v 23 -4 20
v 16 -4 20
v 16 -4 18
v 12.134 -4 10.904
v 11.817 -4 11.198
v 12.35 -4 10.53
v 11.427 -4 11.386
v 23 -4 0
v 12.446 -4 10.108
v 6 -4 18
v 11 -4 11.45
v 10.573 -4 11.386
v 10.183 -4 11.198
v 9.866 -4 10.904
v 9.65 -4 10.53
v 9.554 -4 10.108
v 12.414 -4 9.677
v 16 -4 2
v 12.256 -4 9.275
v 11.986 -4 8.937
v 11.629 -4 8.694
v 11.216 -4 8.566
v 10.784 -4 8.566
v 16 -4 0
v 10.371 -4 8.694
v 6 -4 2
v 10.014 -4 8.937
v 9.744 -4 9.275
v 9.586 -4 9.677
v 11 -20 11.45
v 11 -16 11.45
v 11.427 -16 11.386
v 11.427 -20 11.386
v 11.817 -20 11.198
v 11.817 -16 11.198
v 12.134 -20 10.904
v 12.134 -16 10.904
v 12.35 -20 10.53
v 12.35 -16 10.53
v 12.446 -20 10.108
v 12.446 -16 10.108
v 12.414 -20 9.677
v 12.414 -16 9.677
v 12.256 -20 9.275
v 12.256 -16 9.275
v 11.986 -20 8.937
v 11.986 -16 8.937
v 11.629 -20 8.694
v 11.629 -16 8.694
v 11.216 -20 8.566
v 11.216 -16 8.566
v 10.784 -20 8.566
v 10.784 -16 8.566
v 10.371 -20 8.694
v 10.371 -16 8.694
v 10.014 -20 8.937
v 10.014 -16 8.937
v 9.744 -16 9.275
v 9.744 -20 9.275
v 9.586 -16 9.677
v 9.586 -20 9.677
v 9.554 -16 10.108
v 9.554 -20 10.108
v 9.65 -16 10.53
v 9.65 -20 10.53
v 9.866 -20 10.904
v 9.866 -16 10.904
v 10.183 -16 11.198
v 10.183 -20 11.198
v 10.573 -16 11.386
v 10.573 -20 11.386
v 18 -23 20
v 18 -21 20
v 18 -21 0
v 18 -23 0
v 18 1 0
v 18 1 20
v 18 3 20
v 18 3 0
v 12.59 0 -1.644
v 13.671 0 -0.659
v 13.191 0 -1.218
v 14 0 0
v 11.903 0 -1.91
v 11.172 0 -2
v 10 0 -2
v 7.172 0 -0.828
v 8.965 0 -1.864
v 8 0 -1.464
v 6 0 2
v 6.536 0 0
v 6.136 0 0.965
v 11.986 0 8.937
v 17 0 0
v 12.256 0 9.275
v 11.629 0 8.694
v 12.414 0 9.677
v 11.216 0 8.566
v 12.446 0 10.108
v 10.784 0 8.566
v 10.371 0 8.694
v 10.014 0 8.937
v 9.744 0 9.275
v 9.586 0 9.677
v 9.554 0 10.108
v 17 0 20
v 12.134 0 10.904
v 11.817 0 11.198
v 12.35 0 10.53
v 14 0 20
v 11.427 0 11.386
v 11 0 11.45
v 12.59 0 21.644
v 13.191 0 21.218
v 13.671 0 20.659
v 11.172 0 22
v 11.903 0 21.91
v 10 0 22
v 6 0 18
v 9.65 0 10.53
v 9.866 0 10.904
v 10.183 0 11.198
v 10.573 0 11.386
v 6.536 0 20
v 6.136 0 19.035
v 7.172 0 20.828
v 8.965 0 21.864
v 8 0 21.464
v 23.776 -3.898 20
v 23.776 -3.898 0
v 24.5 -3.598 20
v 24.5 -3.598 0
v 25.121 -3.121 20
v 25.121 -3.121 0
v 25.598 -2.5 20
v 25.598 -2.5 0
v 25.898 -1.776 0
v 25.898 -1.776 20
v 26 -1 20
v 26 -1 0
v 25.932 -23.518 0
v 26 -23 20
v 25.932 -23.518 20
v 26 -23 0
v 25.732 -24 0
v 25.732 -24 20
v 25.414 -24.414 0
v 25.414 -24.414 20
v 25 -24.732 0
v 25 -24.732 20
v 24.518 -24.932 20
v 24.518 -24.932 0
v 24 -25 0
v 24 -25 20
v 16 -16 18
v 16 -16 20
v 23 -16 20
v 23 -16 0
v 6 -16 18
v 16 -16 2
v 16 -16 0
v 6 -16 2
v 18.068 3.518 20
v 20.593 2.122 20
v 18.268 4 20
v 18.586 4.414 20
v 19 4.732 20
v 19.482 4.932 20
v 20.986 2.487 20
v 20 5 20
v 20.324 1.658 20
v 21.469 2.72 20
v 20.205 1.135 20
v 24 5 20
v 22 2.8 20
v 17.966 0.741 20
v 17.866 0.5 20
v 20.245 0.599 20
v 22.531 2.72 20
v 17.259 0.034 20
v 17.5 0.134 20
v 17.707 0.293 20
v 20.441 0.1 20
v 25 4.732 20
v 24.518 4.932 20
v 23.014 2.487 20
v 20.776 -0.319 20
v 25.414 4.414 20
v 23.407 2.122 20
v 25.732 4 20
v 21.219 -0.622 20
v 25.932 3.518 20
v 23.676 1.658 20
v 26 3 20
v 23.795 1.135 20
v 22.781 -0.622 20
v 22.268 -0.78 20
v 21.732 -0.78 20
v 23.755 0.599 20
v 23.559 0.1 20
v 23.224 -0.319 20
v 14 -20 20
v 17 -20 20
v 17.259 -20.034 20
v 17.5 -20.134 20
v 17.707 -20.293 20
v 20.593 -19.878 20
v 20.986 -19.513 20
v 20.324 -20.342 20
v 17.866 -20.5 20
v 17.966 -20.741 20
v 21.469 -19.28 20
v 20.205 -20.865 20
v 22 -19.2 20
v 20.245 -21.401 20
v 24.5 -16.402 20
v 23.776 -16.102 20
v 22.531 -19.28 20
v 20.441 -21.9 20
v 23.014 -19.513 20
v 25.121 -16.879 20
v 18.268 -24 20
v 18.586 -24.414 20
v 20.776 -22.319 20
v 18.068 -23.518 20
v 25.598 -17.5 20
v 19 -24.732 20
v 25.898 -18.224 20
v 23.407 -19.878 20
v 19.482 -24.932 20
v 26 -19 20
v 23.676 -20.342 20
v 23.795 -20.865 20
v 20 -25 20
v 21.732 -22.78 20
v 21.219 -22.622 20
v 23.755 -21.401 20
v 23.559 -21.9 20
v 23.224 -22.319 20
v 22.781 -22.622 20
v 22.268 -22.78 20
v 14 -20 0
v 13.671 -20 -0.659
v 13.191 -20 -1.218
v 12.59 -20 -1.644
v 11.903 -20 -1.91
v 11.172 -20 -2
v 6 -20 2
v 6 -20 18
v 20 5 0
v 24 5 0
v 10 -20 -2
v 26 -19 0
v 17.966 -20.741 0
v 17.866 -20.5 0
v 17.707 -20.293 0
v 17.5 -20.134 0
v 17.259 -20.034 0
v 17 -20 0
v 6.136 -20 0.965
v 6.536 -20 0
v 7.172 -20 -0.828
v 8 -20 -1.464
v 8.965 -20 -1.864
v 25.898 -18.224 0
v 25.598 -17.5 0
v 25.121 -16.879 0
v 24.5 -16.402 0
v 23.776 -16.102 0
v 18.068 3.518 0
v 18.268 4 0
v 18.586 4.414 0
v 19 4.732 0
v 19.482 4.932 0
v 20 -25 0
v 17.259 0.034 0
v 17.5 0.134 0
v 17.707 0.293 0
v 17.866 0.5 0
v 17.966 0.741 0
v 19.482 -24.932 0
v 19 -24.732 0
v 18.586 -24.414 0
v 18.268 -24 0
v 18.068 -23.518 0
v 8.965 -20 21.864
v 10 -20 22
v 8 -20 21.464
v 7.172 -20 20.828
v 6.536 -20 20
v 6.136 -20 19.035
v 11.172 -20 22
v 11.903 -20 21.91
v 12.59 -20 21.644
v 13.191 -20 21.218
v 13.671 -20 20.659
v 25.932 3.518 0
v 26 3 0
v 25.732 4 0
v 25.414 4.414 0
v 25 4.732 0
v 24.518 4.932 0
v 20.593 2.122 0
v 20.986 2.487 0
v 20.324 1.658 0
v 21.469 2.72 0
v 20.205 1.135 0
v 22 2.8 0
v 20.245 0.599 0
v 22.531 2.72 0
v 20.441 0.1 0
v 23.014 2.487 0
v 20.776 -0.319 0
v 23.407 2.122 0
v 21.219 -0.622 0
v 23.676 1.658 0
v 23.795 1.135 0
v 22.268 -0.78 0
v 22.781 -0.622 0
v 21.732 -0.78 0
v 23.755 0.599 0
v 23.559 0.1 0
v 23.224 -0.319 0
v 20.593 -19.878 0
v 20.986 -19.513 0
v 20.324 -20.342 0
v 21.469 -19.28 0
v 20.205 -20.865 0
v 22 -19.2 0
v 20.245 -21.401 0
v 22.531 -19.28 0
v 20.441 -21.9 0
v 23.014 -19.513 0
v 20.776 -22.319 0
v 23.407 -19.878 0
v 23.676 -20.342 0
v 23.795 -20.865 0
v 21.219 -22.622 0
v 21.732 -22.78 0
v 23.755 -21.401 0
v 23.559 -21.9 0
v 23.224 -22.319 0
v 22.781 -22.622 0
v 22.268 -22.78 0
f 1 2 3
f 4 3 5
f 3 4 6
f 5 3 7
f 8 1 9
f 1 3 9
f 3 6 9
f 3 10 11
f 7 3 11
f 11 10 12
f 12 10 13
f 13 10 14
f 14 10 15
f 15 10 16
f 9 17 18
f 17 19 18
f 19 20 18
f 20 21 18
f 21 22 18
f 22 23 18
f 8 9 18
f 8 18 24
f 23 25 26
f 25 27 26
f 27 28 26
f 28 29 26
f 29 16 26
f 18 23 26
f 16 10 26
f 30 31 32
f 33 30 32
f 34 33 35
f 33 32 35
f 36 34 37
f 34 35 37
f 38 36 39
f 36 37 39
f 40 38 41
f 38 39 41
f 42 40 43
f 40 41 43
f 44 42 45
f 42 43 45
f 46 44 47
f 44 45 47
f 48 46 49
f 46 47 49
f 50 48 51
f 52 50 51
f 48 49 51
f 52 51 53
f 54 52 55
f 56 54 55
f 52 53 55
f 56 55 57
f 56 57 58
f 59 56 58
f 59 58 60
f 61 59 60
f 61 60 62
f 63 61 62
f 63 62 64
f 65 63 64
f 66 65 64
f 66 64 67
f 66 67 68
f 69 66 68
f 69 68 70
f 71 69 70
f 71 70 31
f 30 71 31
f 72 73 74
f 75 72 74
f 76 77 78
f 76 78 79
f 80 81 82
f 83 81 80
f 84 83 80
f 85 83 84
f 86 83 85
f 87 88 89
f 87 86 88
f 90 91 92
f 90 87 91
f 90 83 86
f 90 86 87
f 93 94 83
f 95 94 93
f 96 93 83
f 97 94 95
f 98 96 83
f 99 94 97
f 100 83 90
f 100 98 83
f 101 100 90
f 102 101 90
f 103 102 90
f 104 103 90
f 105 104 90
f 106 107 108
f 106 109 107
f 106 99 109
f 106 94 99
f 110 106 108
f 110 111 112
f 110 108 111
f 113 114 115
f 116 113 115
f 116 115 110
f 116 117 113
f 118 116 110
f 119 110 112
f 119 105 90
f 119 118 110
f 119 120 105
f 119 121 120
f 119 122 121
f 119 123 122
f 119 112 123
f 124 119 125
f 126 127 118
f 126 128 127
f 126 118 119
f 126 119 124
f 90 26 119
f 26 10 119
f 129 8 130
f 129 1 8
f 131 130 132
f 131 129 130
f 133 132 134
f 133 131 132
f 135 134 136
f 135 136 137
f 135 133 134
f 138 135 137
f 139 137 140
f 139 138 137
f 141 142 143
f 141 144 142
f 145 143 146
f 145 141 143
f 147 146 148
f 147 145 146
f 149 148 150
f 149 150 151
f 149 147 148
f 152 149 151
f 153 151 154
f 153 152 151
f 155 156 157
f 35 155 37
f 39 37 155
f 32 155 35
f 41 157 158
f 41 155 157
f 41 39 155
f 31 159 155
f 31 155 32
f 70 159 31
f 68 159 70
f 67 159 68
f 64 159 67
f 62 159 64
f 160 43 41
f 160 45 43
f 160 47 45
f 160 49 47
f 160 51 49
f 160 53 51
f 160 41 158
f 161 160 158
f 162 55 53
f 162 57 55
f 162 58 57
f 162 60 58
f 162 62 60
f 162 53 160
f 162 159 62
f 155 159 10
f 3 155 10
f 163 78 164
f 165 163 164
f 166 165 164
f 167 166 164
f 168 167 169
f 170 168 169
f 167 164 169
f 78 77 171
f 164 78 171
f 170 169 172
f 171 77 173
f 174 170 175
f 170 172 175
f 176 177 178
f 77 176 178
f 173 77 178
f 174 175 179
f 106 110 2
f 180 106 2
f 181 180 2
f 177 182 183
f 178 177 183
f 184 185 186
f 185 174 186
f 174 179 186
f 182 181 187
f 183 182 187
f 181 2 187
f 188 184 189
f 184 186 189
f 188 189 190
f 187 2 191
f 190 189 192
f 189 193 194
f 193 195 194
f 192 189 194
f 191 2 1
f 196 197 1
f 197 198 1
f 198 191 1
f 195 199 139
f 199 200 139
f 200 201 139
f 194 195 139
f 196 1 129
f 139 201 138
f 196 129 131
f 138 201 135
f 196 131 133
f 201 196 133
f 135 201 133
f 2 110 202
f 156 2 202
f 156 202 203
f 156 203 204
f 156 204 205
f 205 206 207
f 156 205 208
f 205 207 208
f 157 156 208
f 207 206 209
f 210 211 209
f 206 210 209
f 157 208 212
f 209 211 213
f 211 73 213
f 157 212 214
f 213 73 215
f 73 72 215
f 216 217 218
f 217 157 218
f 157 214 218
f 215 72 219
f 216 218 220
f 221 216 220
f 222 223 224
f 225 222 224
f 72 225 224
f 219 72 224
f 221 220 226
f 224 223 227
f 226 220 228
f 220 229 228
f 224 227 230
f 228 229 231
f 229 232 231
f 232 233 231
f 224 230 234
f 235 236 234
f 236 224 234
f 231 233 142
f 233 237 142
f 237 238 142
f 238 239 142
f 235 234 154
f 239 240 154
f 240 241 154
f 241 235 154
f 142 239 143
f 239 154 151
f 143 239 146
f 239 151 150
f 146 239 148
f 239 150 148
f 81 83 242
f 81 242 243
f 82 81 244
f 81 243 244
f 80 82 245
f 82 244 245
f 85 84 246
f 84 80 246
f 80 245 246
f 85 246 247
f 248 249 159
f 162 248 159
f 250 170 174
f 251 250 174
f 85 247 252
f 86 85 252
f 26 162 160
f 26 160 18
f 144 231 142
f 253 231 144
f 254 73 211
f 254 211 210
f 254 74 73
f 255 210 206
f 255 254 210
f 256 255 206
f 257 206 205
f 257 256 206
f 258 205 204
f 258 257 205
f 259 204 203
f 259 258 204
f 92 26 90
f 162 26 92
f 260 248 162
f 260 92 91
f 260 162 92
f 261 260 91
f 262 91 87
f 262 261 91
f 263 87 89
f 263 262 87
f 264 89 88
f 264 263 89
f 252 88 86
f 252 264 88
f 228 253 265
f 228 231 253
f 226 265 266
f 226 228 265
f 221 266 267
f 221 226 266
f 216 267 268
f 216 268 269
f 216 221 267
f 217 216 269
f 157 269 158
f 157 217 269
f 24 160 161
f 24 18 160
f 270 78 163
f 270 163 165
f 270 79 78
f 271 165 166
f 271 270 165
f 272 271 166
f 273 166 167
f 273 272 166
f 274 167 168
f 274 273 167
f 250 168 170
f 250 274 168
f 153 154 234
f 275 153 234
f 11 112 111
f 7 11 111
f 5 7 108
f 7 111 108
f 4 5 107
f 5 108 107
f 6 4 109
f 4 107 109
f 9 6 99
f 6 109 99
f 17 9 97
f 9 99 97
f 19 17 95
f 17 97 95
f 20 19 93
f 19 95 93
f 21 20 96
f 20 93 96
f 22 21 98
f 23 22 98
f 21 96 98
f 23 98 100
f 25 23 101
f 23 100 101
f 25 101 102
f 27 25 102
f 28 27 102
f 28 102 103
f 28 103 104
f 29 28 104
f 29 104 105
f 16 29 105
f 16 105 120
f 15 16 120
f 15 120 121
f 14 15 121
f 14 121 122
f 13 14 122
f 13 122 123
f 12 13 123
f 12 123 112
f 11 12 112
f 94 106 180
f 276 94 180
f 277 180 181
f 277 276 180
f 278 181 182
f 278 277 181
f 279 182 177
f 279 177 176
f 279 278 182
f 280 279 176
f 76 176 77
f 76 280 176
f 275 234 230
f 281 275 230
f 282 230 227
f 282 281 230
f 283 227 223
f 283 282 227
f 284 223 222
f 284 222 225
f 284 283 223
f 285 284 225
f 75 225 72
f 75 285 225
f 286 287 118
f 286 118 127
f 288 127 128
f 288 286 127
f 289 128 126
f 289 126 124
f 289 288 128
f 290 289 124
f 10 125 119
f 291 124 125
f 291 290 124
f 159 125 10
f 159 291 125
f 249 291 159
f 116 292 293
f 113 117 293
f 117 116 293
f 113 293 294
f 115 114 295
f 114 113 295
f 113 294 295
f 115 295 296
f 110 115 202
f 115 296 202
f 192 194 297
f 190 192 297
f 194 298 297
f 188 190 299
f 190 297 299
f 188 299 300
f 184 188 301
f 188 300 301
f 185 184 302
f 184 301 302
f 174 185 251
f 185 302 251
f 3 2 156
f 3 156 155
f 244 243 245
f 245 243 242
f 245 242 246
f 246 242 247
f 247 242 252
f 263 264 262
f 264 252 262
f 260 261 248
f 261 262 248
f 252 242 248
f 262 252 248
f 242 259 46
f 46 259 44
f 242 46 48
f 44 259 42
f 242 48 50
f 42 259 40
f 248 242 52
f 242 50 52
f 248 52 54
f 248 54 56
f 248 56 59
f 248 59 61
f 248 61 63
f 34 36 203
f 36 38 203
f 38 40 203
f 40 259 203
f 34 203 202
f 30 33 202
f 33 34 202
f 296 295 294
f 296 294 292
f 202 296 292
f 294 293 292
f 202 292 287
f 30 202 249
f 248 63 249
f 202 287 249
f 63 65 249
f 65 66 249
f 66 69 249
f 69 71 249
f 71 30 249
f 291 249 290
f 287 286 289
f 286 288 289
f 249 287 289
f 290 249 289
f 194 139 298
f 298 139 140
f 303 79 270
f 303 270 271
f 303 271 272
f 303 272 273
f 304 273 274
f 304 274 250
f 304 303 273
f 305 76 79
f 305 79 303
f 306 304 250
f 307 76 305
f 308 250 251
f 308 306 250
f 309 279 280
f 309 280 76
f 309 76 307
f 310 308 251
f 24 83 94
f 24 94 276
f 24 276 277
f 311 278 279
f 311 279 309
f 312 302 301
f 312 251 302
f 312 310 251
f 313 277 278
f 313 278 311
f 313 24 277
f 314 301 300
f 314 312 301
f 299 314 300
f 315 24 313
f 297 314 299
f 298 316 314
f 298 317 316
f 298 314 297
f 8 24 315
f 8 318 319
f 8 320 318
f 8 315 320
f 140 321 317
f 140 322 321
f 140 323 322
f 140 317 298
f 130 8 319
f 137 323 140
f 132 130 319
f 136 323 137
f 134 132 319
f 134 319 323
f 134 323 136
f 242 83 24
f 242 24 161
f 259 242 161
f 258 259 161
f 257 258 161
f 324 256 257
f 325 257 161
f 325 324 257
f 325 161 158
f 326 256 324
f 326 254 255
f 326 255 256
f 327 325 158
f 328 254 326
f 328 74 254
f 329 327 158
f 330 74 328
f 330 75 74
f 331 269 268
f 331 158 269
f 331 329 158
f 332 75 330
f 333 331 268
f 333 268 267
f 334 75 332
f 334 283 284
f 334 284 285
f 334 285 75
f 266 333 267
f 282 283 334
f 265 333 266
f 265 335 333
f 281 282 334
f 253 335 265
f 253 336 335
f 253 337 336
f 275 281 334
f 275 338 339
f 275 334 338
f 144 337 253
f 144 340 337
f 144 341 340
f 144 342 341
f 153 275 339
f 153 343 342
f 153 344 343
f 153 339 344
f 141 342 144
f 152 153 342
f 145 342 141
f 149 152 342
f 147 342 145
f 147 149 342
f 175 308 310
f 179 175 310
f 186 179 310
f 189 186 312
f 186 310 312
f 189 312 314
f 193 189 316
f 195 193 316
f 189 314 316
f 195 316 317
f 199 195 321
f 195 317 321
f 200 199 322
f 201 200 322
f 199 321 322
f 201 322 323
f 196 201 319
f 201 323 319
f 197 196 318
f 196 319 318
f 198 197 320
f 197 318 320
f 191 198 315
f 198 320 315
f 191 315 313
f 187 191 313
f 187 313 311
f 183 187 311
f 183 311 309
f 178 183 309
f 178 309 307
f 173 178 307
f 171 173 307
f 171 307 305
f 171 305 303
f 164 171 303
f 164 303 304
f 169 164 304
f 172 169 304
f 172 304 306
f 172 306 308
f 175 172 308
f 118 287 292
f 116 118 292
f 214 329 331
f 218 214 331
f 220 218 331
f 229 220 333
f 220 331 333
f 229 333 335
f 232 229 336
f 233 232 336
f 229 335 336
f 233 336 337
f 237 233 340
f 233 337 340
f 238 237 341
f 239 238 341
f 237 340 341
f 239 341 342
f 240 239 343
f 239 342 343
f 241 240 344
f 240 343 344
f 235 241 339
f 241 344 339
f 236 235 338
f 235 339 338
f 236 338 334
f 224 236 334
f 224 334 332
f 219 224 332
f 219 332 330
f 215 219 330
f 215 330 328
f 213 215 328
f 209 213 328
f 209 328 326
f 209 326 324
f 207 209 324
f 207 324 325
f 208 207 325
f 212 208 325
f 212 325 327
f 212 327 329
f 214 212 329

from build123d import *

# Parameters (mm, degrees)
SKETCH1_W           = 20
SKETCH1_H           = 20
BOSS_EXTRUDE1_DEPTH = 4
SKETCH2_R           = 3.7
CUT_EXTRUDE1_DEPTH  = 2.6
SKETCH3_R           = 2.1
CUT_EXTRUDE2_DEPTH  = 29.403520909
SKETCH4_W           = 12
SKETCH4_H           = 4
BOSS_EXTRUDE2_DEPTH = 12
SKETCH7_W           = 20
SKETCH7_H           = 4
BOSS_EXTRUDE3_DEPTH = 10
SKETCH8_W           = 8
SKETCH8_H           = 20
BOSS_EXTRUDE4_DEPTH = 5
SKETCH9_W           = 8
SKETCH9_H           = 20
BOSS_EXTRUDE5_DEPTH = 5
SKETCH10_R          = 1.8
CUT_EXTRUDE5_DEPTH  = 42.243181255
SKETCH11_W          = 30
SKETCH11_H          = 30
CUT_EXTRUDE6_DEPTH  = 6
SKETCH12_R          = 1.45
CUT_EXTRUDE7_DEPTH  = 42.243181255
SKETCH13_W          = 8
SKETCH13_H          = 20
BOSS_EXTRUDE6_DEPTH = 2
SKETCH14_W          = 8
SKETCH14_H          = 20
BOSS_EXTRUDE7_DEPTH = 2
SKETCH15_W          = 16
SKETCH15_H          = 12
CUT_EXTRUDE8_DEPTH  = 39.845849199
FILLET2_R           = 3
FILLET4_R           = 2
FILLET5_START       = -21
FILLET5_DEPTH       = 22
FILLET6_R           = 3
FILLET7_R           = 1
FILLET8_R           = 1


with BuildPart() as part:
    # Sketch1 → Boss-Extrude1 (new body)
    with BuildSketch(Plane(origin=(0, 0, 0), x_dir=(0, 0, -1), z_dir=(1, 0, 0))):
        with Locations((-10, -10)):
            Rectangle(SKETCH1_W, SKETCH1_H)
    extrude(amount=BOSS_EXTRUDE1_DEPTH)

    # Sketch2 → Cut-Extrude1 (cut)
    with BuildSketch(Plane(origin=(4, 0, 0), x_dir=(0, 0, -1), z_dir=(1, 0, 0))):
        with Locations((-10, -10)):
            Circle(SKETCH2_R)
    extrude(amount=-CUT_EXTRUDE1_DEPTH, mode=Mode.SUBTRACT)

    # Sketch3 → Cut-Extrude2 (cut, through all)
    with BuildSketch(Plane(origin=(1.4, 0, 0), x_dir=(0, 0, -1), z_dir=(1, 0, 0))):
        with Locations((-10, -10)):
            Circle(SKETCH3_R)
    extrude(amount=-CUT_EXTRUDE2_DEPTH, mode=Mode.SUBTRACT)

    # Sketch4 → Boss-Extrude2 (add)
    with BuildSketch(Plane(origin=(4, 0, 0), x_dir=(0, 0, -1), z_dir=(1, 0, 0))):
        Polygon((-20, 0), (-20, -20), (-16, -20), (-16, -16), (-16, -4), (-16, 0), align=None)
        with Locations((-10, -18)):
            Rectangle(SKETCH4_W, SKETCH4_H)
        Polygon((-4, -16), (-4, -20), (0, -20), (0, -4), (-4, -4), align=None)
        Polygon((0, 0), (-16, 0), (-16, -4), (-4, -4), (0, -4), align=None)
    extrude(amount=BOSS_EXTRUDE2_DEPTH)

    # Sketch7 → Boss-Extrude3 (add)
    with BuildSketch(Plane(origin=(16, 0, 0), x_dir=(0, 0, -1), z_dir=(1, 0, 0))):
        with Locations((-10, -18)):
            Rectangle(SKETCH7_W, SKETCH7_H)
        with Locations((-10, -2)):
            Rectangle(SKETCH7_W, SKETCH7_H)
    extrude(amount=BOSS_EXTRUDE3_DEPTH)

    # Sketch8 → Boss-Extrude4 (add)
    with BuildSketch(Plane(origin=(0, -20, 0), x_dir=(-1, 0, 0), z_dir=(0, -1, 0))):
        with Locations((-22, -10)):
            Rectangle(SKETCH8_W, SKETCH8_H)
    extrude(amount=BOSS_EXTRUDE4_DEPTH)

    # Sketch9 → Boss-Extrude5 (add)
    with BuildSketch(Plane(origin=(0, 0, 0), x_dir=(1, 0, 0), z_dir=(0, 1, 0))):
        with Locations((22, -10)):
            Rectangle(SKETCH9_W, SKETCH9_H)
    extrude(amount=BOSS_EXTRUDE5_DEPTH)

    # Sketch10 → Cut-Extrude5 (cut, through all)
    with BuildSketch(Plane(origin=(0, 0, 0), x_dir=(-1, 0, 0), z_dir=(0, 0, -1))):
        with Locations(Location((-22, 1, 0), (0, 0, 90))):
            Circle(SKETCH10_R)
        with Locations(Location((-22, -21, 0), (0, 0, 90))):
            Circle(SKETCH10_R)
    extrude(amount=-CUT_EXTRUDE5_DEPTH, mode=Mode.SUBTRACT)

    # Sketch11 → Cut-Extrude6 (cut)
    with BuildSketch(Plane.ZY):
        with Locations((15, -5)):
            Rectangle(SKETCH11_W, SKETCH11_H)
    extrude(amount=-CUT_EXTRUDE6_DEPTH, mode=Mode.SUBTRACT)

    # Sketch12 → Cut-Extrude7 (cut, through all)
    with BuildSketch(Plane(origin=(0, 0, 0), x_dir=(1, 0, 0), z_dir=(0, 1, 0))):
        with Locations(Location((11, -10, 0), (0, 0, 270))):
            Circle(SKETCH12_R)
    extrude(amount=-CUT_EXTRUDE7_DEPTH, mode=Mode.SUBTRACT)

    # Sketch13 → Boss-Extrude6 (add)
    with BuildSketch(Plane.XY.offset(20)):
        with Locations((10, -10)):
            Rectangle(SKETCH13_W, SKETCH13_H)
    extrude(amount=BOSS_EXTRUDE6_DEPTH)

    # Sketch14 → Boss-Extrude7 (add)
    with BuildSketch(Plane(origin=(0, 0, 0), x_dir=(-1, 0, 0), z_dir=(0, 0, -1))):
        with Locations((-10, -10)):
            Rectangle(SKETCH14_W, SKETCH14_H)
    extrude(amount=BOSS_EXTRUDE7_DEPTH)

    # Sketch15 → Cut-Extrude8 (cut, through all)
    with BuildSketch(Plane.ZY.offset(-6)):
        with Locations((10, -10)):
            Rectangle(SKETCH15_W, SKETCH15_H)
    extrude(amount=-CUT_EXTRUDE8_DEPTH, mode=Mode.SUBTRACT)

    # Fillet2
    fillet2_edges = [part.edges().sort_by_distance(p)[0] for p in [
        (26, -16, 10),
        (26, -4, 10),
    ]]
    fillet(fillet2_edges, radius=FILLET2_R)

    # Fillet4
    fillet4_edges = [part.edges().sort_by_distance(p)[0] for p in [
        (26, -25, 10),
        (18, -25, 10),
        (26, 5, 10),
        (18, 5, 10),
    ]]
    fillet(fillet4_edges, radius=FILLET4_R)

    # Fillet5: read off the stored shape, not the designer's step
    # Fillet5 outline → Fillet5 (cut)
    with BuildSketch(Plane(origin=(0, 0, 0), x_dir=(1, 0, 0), z_dir=(0, 1, 0)).offset(FILLET5_START)):
        with BuildLine():
            Line((6, 2), (6, -2))
            ThreePointArc((6, -2), (7.171572875, 0.828427125), (10, 2))
            Line((10, 2), (6, 2))
        make_face()
        with BuildLine():
            ThreePointArc((10, -22), (7.171572875, -20.828427125), (6, -18))
            Line((6, -18), (6, -22))
            Line((6, -22), (10, -22))
        make_face()
    extrude(amount=FILLET5_DEPTH, mode=Mode.SUBTRACT)

    # Fillet6
    # the kernel refuses this fillet: 3 mm, written as the material it takes off along each edge
    with BuildSketch(Plane(origin=(14, -27.071067812, -2), x_dir=(-1, 0, 0), z_dir=(0, 1, 0))) as fillet6_piece_1:
        with BuildLine():
            CenterArc((2.828427125, 3), FILLET6_R, 199.471220634, 70.528779366)
            Line((0, 2), (-0.056568542, 1.98))
            ThreePointArc((-0.056568542, 1.98), (-0.06, 1), (-0.06, 0))
            Line((-0.06, 0), (0, -0.06))
            Line((0, -0.06), (2.828427125, -0.06))
            Line((2.828427125, -0.06), (2.828427125, 0))
        make_face()
    extrude(amount=34.142135624, mode=Mode.SUBTRACT)
    with BuildSketch(Plane(origin=(14, -27.071067812, 22), x_dir=(0, 0, -1), z_dir=(0, 1, 0))) as fillet6_piece_2:
        with BuildLine():
            CenterArc((3, 2.828427125), FILLET6_R, 180, 70.528779366)
            Line((0, 2.828427125), (-0.06, 2.828427125))
            Line((-0.06, 2.828427125), (-0.06, 0))
            Line((-0.06, 0), (0, -0.06))
            ThreePointArc((0, -0.06), (1, -0.06), (1.98, -0.056568542))
            Line((1.98, -0.056568542), (2, 0))
        make_face()
    extrude(amount=34.142135624, mode=Mode.SUBTRACT)

    # Fillet7
    fillet7_edges = [part.edges().sort_by_distance(p)[0] for p in [
        (18, -20, 10),
    ]]
    fillet(fillet7_edges, radius=FILLET7_R)

    # Fillet8
    fillet8_edges = [part.edges().sort_by_distance(p)[0] for p in [
        (18, 0, 10),
    ]]
    fillet(fillet8_edges, radius=FILLET8_R)


solid = part.part
